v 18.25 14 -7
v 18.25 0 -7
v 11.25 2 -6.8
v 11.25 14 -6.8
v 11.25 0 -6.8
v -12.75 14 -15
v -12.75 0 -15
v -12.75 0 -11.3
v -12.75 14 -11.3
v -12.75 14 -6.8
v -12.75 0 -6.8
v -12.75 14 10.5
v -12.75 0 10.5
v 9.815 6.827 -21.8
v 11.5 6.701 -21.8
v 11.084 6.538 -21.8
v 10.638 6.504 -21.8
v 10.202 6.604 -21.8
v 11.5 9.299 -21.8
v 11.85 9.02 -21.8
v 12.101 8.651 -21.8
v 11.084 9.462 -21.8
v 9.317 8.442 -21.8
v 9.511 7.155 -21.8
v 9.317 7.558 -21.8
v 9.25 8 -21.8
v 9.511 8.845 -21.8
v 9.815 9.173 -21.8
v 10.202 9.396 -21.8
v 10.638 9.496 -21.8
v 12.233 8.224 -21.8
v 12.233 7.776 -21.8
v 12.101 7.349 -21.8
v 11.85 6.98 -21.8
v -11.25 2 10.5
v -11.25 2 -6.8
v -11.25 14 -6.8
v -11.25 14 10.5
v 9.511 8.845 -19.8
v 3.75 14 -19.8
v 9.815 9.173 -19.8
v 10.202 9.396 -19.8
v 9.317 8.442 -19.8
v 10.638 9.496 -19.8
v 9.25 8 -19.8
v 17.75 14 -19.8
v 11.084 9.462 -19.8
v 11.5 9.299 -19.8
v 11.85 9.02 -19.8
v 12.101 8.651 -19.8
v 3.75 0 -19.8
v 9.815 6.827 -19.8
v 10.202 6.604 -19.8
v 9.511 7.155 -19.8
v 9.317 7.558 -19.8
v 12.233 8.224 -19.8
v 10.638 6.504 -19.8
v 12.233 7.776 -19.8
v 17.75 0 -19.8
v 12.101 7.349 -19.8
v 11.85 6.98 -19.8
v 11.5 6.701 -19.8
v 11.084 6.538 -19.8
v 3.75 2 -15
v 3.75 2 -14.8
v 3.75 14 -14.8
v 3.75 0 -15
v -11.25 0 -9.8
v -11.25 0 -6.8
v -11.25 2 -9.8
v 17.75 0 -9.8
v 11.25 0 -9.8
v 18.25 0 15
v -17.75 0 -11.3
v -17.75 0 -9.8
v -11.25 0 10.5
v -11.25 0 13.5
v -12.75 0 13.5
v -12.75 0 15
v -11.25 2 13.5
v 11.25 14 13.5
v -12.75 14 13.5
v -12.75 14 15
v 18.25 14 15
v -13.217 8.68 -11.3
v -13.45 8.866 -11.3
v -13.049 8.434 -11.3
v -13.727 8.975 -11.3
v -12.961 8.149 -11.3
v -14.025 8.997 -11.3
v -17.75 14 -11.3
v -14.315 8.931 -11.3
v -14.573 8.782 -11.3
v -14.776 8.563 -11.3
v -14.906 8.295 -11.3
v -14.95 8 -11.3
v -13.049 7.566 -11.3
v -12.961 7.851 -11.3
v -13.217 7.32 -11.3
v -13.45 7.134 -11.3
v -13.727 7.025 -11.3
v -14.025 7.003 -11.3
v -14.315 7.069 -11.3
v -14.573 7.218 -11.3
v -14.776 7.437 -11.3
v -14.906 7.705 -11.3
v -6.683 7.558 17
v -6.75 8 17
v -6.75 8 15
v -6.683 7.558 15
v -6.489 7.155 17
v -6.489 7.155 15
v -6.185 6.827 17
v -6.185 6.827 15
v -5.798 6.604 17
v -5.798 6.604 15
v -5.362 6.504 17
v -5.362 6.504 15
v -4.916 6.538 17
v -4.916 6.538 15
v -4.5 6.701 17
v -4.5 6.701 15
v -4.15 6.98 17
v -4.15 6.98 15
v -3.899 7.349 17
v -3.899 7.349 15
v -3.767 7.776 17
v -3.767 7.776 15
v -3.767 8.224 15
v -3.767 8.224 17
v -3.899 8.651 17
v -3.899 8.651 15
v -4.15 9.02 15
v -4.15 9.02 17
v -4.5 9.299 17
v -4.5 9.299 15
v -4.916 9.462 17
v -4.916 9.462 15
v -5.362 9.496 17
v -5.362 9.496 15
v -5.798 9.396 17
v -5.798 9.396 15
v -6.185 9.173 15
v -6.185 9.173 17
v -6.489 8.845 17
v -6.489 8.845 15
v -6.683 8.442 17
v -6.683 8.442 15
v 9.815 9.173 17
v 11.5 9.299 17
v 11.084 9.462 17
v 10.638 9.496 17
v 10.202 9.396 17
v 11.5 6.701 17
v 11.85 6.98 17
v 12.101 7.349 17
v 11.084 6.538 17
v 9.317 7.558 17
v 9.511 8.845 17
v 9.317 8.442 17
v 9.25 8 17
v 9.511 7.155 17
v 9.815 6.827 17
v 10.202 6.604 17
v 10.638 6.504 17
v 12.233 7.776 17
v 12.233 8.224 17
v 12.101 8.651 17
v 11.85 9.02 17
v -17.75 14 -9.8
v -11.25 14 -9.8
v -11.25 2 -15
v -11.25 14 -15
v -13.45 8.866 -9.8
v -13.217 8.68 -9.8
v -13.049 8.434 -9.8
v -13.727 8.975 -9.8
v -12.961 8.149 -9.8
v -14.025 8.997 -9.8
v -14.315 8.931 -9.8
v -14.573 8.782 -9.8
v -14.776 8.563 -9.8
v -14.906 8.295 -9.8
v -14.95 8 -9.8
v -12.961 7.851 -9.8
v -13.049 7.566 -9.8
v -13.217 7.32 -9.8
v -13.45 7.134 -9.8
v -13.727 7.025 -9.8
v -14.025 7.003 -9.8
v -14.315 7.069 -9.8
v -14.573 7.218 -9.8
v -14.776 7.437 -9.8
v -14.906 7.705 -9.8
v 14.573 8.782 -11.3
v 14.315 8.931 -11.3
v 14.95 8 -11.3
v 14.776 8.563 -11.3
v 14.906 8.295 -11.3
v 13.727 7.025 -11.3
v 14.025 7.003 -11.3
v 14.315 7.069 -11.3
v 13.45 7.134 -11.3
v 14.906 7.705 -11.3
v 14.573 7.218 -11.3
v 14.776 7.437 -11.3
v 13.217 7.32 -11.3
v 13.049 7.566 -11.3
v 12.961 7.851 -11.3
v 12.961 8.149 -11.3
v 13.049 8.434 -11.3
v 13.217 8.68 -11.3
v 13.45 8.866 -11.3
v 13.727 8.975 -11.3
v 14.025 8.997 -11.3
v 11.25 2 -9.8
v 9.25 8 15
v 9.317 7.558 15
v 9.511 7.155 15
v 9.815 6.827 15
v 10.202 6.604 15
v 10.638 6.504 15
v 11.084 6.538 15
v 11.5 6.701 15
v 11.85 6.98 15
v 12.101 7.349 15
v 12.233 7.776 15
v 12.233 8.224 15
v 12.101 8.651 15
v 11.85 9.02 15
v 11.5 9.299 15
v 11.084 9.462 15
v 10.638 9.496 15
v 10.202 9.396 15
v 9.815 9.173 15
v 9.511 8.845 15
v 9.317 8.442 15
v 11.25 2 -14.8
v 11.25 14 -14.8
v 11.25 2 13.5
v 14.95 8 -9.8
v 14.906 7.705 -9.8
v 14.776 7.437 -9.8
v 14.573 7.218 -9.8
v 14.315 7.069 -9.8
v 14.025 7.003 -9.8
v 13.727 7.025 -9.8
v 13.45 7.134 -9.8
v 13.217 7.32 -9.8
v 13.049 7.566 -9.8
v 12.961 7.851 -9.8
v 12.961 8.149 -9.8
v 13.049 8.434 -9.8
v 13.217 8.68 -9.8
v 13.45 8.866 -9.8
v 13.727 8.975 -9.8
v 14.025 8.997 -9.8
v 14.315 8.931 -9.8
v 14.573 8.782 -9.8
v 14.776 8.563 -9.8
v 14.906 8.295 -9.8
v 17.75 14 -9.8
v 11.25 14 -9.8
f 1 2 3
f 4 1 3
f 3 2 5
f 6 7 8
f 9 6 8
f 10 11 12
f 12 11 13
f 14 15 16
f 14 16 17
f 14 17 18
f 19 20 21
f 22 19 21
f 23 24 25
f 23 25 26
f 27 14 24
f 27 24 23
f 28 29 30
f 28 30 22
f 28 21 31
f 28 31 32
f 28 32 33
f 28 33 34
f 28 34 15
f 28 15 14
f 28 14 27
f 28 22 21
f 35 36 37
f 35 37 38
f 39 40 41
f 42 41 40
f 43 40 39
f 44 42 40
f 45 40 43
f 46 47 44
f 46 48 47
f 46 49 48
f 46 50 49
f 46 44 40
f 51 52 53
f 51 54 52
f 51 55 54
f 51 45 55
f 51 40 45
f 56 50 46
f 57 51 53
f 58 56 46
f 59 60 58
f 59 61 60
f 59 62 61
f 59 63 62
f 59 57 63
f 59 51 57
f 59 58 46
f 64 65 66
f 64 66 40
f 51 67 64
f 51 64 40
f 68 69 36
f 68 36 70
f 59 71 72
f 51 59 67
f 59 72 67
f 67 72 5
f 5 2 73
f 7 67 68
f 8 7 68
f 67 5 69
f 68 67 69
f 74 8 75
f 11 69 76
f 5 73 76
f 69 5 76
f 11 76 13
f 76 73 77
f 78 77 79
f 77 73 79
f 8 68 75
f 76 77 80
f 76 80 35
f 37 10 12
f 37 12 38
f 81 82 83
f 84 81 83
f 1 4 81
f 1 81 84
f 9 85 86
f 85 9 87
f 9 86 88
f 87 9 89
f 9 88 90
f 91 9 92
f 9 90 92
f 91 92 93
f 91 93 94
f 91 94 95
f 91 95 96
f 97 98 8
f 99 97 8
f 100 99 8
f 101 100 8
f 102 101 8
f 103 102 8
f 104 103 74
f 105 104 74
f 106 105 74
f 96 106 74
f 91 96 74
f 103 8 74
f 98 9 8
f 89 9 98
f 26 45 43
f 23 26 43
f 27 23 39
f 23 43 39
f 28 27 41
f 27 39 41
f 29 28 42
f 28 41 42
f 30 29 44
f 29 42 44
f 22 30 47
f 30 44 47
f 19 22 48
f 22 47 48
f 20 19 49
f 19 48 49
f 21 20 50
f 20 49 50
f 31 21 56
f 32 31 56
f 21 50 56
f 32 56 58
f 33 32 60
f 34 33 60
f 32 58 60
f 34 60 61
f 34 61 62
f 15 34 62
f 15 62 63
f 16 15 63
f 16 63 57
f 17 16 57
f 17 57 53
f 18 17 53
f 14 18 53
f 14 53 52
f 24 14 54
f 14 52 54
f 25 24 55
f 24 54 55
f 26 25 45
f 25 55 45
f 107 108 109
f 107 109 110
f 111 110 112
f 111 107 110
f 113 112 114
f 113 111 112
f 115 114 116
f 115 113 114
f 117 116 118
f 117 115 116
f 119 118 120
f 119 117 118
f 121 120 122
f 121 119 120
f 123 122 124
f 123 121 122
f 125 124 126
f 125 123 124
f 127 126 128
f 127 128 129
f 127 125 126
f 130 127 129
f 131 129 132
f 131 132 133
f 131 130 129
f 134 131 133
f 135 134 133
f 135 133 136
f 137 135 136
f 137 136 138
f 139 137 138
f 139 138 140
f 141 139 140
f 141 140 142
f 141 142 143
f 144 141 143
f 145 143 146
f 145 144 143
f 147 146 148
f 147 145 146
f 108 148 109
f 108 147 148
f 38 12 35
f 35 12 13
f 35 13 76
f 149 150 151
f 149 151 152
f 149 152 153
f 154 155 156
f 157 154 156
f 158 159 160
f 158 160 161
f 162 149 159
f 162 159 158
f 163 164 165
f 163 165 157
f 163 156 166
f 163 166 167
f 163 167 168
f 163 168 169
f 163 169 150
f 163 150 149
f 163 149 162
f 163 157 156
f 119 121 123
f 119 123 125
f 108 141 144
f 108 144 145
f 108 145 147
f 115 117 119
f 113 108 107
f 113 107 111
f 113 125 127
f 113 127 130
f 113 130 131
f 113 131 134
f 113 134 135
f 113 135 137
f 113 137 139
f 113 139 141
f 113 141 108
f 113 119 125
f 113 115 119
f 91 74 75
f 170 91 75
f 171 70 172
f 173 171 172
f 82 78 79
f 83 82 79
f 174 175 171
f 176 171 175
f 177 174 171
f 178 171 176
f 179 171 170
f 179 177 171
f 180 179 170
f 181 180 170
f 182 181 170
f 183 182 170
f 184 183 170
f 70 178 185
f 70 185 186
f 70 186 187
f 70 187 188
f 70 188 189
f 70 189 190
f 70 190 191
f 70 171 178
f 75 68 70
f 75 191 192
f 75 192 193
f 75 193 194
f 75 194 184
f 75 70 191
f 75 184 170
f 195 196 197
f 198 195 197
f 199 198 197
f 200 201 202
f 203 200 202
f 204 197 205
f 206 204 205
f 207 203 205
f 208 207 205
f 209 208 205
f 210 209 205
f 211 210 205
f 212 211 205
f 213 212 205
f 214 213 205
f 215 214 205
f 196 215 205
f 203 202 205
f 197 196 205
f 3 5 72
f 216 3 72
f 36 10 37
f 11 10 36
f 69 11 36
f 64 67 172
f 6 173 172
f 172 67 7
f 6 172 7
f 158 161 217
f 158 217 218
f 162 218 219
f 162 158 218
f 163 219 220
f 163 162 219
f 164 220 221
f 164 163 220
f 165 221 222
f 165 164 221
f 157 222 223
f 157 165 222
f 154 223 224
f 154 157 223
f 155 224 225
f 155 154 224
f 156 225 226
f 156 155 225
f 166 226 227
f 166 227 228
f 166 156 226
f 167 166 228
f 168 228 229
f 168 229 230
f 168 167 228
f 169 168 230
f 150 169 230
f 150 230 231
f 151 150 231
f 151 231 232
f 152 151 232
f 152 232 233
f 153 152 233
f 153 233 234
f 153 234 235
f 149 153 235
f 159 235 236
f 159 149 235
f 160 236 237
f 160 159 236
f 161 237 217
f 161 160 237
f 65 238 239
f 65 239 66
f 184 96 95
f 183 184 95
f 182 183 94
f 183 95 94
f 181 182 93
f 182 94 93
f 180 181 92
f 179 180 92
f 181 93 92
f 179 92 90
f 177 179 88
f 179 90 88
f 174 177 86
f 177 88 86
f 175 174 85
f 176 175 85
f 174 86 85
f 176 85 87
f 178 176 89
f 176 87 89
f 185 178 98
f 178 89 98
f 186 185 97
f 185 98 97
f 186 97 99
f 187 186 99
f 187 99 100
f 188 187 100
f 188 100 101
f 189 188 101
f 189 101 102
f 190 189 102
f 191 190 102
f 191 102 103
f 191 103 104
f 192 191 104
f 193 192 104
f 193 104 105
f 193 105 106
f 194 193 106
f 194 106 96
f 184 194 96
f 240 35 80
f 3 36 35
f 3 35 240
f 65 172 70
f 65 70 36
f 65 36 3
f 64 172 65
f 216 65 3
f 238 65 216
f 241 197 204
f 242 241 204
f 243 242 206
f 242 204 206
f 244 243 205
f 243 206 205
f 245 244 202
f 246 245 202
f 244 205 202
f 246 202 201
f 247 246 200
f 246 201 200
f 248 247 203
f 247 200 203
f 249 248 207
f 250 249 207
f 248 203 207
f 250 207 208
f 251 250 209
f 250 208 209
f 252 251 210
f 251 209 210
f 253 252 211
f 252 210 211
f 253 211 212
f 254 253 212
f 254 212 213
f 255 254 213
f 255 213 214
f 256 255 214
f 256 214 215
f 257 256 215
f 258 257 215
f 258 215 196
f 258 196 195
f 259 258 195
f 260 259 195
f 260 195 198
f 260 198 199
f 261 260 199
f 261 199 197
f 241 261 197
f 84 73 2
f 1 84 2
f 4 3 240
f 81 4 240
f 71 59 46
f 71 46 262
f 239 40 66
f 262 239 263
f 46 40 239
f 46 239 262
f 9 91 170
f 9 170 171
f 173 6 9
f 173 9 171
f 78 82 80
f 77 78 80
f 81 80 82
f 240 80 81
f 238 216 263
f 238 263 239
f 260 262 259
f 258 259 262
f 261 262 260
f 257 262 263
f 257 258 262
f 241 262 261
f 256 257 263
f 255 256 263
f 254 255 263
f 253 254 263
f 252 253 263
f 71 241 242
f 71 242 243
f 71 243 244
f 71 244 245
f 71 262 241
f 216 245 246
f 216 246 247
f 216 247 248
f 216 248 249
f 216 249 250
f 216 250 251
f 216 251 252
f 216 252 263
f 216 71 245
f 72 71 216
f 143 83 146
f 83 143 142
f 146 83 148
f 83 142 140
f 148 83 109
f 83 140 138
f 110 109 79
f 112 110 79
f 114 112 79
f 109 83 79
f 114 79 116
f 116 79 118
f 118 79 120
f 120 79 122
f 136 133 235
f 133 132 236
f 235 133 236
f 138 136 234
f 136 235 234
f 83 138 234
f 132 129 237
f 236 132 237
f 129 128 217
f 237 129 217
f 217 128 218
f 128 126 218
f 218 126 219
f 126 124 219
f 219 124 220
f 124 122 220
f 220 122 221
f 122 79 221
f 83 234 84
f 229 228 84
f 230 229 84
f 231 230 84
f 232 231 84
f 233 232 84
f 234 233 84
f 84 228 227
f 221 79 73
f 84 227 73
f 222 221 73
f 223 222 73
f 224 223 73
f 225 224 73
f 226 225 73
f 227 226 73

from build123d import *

# Parameters (mm, degrees)
SKETCH_1_W          = 22.5
SKETCH_1_H          = 30
EXTRUDE_1_DEPTH     = 2
SKETCH_2_W          = 22.5
SKETCH_2_H          = 1.5
EXTRUDE_2_DEPTH     = 12
EXTRUDE_4_REACH     = 25.4
SKETCH_3_W          = 1.5
SKETCH_3_H          = 17.3
SKETCH_3_H_2        = 1.5
SKETCH_6_R          = 1.5
EXTRUDE_5_DEPTH     = 2
EXTRUDE_START       = 2
SKETCH_7_R          = 1.5
EXTRUDE_6_DEPTH     = 2
CUT_EXTRUDE_1_REACH = 38.469
SKETCH_8_R          = 1


with BuildPart() as part:
    # 草图1 → 凸台-拉伸1 (new body)
    with BuildSketch(Plane(origin=(0, 0, 0), x_dir=(1, 0, 0), z_dir=(0, 1, 0))):
        Rectangle(SKETCH_1_W, SKETCH_1_H)
    extrude(amount=EXTRUDE_1_DEPTH)

    # 草图2 → 凸台-拉伸2 (add)
    with BuildSketch(Plane(origin=(0, 2, 0), x_dir=(1, 0, 0), z_dir=(0, 1, 0))):
        with Locations((0, -14.25)):
            Rectangle(SKETCH_2_W, SKETCH_2_H)
    extrude(amount=EXTRUDE_2_DEPTH)

    # 凸台-拉伸4: up to this face of the body (flat: up to its plane)
    extrude_4_end = Plane(part.part.faces().sort_by_distance((0, 14, 14.25))[0])
    # 草图3 → 凸台-拉伸4 (add, up to the picked face)
    with BuildSketch(Plane.XZ, mode=Mode.PRIVATE) as extrude_4_sk1:
        Polygon((-11.25, -15), (-12.75, -15), (-12.75, -11.3), (-17.75, -11.3), (-17.75, -9.8), (-12.75, -9.8), (-11.25, -9.8), align=None)
    extrude_4_tool1 = split(extrude(extrude_4_sk1.sketch, amount=-EXTRUDE_4_REACH, mode=Mode.PRIVATE), bisect_by=extrude_4_end, keep=Keep.BOTH, mode=Mode.PRIVATE)
    # 草图3 → 凸台-拉伸4 (add, up to the picked face)
    with BuildSketch(Plane.XZ, mode=Mode.PRIVATE) as extrude_4_sk2:
        with Locations((-12, 1.85)):
            Rectangle(SKETCH_3_W, SKETCH_3_H)
    extrude_4_tool2 = split(extrude(extrude_4_sk2.sketch, amount=-EXTRUDE_4_REACH, mode=Mode.PRIVATE), bisect_by=extrude_4_end, keep=Keep.BOTH, mode=Mode.PRIVATE)
    # 草图3 → 凸台-拉伸4 (add, up to the picked face)
    with BuildSketch(Plane.XZ, mode=Mode.PRIVATE) as extrude_4_sk3:
        with Locations((-12, 14.25)):
            Rectangle(SKETCH_3_W, SKETCH_3_H_2)
    extrude_4_tool3 = split(extrude(extrude_4_sk3.sketch, amount=-EXTRUDE_4_REACH, mode=Mode.PRIVATE), bisect_by=extrude_4_end, keep=Keep.BOTH, mode=Mode.PRIVATE)
    # 草图3 → 凸台-拉伸4 (add, up to the picked face)
    with BuildSketch(Plane.XZ, mode=Mode.PRIVATE) as extrude_4_sk4:
        Polygon((11.25, -9.8), (11.25, -14.8), (3.75, -14.8), (3.75, -19.8), (17.75, -19.8), (17.75, -11.3), (17.75, -9.8), (12.75, -9.8), align=None)
    extrude_4_tool4 = split(extrude(extrude_4_sk4.sketch, amount=-EXTRUDE_4_REACH, mode=Mode.PRIVATE), bisect_by=extrude_4_end, keep=Keep.BOTH, mode=Mode.PRIVATE)
    # 草图3 → 凸台-拉伸4 (add, up to the picked face)
    with BuildSketch(Plane.XZ, mode=Mode.PRIVATE) as extrude_4_sk5:
        Polygon((18.25, -7), (11.25, -6.8), (11.25, 15), (18.25, 15), align=None)
    extrude_4_tool5 = split(extrude(extrude_4_sk5.sketch, amount=-EXTRUDE_4_REACH, mode=Mode.PRIVATE), bisect_by=extrude_4_end, keep=Keep.BOTH, mode=Mode.PRIVATE)
    add(extrude_4_tool1.solids().sort_by(Axis((-12, 0, -14.916759), (0, 1, 0)))[0])
    add(extrude_4_tool2.solids().sort_by(Axis((-12, 0, 1.85), (0, 1, 0)))[0])
    add(extrude_4_tool3.solids().sort_by(Axis((-12, 0, 14.25), (0, 1, 0)))[0])
    add(extrude_4_tool4.solids().sort_by(Axis((11.939024, 0, -15.714634), (0, 1, 0)))[0])
    add(extrude_4_tool5.solids().sort_by(Axis((14.755327, 0, 4.049924), (0, 1, 0)))[0])

    # 草图6 → 凸台-拉伸5 (add)
    with BuildSketch(Plane(origin=(0, 0, -19.8), x_dir=(-1, 0, 0), z_dir=(0, 0, -1))):
        with Locations((-10.75, 8)):
            Circle(SKETCH_6_R)
    extrude(amount=EXTRUDE_5_DEPTH)

    # 草图7 → 凸台-拉伸6 (add)
    with BuildSketch(Plane.XY.offset(15).offset(EXTRUDE_START)):
        with Locations(Location((10.75, 8, 0), (0, 0, 180))):
            Circle(SKETCH_7_R)
        with Locations(Location((-5.25, 8, 0), (0, 0, 180))):
            Circle(SKETCH_7_R)
    extrude(amount=-EXTRUDE_6_DEPTH)

    # 草图8 → 切除-拉伸1 (cut, up to next)
    with BuildSketch(Plane(origin=(0, 0, -11.3), x_dir=(-1, 0, 0), z_dir=(0, 0, -1)), mode=Mode.PRIVATE) as cut_extrude_1_sk1:
        with Locations((13.95, 8)):
            Circle(SKETCH_8_R)
    cut_extrude_1_tool1 = extrude(cut_extrude_1_sk1.sketch, amount=-CUT_EXTRUDE_1_REACH, mode=Mode.PRIVATE) & part.part
    # 草图8 → 切除-拉伸1 (cut, up to next)
    with BuildSketch(Plane(origin=(0, 0, -11.3), x_dir=(-1, 0, 0), z_dir=(0, 0, -1)), mode=Mode.PRIVATE) as cut_extrude_1_sk2:
        with Locations(Location((-13.95, 8, 0), (0, 0, 180))):
            Circle(SKETCH_8_R)
    cut_extrude_1_tool2 = extrude(cut_extrude_1_sk2.sketch, amount=-CUT_EXTRUDE_1_REACH, mode=Mode.PRIVATE) & part.part
    add(cut_extrude_1_tool1.solids().sort_by_distance((-13.95, 8, -11.3))[0], mode=Mode.SUBTRACT)
    add(cut_extrude_1_tool2.solids().sort_by_distance((13.95, 8, -11.3))[0], mode=Mode.SUBTRACT)


solid = part.part
